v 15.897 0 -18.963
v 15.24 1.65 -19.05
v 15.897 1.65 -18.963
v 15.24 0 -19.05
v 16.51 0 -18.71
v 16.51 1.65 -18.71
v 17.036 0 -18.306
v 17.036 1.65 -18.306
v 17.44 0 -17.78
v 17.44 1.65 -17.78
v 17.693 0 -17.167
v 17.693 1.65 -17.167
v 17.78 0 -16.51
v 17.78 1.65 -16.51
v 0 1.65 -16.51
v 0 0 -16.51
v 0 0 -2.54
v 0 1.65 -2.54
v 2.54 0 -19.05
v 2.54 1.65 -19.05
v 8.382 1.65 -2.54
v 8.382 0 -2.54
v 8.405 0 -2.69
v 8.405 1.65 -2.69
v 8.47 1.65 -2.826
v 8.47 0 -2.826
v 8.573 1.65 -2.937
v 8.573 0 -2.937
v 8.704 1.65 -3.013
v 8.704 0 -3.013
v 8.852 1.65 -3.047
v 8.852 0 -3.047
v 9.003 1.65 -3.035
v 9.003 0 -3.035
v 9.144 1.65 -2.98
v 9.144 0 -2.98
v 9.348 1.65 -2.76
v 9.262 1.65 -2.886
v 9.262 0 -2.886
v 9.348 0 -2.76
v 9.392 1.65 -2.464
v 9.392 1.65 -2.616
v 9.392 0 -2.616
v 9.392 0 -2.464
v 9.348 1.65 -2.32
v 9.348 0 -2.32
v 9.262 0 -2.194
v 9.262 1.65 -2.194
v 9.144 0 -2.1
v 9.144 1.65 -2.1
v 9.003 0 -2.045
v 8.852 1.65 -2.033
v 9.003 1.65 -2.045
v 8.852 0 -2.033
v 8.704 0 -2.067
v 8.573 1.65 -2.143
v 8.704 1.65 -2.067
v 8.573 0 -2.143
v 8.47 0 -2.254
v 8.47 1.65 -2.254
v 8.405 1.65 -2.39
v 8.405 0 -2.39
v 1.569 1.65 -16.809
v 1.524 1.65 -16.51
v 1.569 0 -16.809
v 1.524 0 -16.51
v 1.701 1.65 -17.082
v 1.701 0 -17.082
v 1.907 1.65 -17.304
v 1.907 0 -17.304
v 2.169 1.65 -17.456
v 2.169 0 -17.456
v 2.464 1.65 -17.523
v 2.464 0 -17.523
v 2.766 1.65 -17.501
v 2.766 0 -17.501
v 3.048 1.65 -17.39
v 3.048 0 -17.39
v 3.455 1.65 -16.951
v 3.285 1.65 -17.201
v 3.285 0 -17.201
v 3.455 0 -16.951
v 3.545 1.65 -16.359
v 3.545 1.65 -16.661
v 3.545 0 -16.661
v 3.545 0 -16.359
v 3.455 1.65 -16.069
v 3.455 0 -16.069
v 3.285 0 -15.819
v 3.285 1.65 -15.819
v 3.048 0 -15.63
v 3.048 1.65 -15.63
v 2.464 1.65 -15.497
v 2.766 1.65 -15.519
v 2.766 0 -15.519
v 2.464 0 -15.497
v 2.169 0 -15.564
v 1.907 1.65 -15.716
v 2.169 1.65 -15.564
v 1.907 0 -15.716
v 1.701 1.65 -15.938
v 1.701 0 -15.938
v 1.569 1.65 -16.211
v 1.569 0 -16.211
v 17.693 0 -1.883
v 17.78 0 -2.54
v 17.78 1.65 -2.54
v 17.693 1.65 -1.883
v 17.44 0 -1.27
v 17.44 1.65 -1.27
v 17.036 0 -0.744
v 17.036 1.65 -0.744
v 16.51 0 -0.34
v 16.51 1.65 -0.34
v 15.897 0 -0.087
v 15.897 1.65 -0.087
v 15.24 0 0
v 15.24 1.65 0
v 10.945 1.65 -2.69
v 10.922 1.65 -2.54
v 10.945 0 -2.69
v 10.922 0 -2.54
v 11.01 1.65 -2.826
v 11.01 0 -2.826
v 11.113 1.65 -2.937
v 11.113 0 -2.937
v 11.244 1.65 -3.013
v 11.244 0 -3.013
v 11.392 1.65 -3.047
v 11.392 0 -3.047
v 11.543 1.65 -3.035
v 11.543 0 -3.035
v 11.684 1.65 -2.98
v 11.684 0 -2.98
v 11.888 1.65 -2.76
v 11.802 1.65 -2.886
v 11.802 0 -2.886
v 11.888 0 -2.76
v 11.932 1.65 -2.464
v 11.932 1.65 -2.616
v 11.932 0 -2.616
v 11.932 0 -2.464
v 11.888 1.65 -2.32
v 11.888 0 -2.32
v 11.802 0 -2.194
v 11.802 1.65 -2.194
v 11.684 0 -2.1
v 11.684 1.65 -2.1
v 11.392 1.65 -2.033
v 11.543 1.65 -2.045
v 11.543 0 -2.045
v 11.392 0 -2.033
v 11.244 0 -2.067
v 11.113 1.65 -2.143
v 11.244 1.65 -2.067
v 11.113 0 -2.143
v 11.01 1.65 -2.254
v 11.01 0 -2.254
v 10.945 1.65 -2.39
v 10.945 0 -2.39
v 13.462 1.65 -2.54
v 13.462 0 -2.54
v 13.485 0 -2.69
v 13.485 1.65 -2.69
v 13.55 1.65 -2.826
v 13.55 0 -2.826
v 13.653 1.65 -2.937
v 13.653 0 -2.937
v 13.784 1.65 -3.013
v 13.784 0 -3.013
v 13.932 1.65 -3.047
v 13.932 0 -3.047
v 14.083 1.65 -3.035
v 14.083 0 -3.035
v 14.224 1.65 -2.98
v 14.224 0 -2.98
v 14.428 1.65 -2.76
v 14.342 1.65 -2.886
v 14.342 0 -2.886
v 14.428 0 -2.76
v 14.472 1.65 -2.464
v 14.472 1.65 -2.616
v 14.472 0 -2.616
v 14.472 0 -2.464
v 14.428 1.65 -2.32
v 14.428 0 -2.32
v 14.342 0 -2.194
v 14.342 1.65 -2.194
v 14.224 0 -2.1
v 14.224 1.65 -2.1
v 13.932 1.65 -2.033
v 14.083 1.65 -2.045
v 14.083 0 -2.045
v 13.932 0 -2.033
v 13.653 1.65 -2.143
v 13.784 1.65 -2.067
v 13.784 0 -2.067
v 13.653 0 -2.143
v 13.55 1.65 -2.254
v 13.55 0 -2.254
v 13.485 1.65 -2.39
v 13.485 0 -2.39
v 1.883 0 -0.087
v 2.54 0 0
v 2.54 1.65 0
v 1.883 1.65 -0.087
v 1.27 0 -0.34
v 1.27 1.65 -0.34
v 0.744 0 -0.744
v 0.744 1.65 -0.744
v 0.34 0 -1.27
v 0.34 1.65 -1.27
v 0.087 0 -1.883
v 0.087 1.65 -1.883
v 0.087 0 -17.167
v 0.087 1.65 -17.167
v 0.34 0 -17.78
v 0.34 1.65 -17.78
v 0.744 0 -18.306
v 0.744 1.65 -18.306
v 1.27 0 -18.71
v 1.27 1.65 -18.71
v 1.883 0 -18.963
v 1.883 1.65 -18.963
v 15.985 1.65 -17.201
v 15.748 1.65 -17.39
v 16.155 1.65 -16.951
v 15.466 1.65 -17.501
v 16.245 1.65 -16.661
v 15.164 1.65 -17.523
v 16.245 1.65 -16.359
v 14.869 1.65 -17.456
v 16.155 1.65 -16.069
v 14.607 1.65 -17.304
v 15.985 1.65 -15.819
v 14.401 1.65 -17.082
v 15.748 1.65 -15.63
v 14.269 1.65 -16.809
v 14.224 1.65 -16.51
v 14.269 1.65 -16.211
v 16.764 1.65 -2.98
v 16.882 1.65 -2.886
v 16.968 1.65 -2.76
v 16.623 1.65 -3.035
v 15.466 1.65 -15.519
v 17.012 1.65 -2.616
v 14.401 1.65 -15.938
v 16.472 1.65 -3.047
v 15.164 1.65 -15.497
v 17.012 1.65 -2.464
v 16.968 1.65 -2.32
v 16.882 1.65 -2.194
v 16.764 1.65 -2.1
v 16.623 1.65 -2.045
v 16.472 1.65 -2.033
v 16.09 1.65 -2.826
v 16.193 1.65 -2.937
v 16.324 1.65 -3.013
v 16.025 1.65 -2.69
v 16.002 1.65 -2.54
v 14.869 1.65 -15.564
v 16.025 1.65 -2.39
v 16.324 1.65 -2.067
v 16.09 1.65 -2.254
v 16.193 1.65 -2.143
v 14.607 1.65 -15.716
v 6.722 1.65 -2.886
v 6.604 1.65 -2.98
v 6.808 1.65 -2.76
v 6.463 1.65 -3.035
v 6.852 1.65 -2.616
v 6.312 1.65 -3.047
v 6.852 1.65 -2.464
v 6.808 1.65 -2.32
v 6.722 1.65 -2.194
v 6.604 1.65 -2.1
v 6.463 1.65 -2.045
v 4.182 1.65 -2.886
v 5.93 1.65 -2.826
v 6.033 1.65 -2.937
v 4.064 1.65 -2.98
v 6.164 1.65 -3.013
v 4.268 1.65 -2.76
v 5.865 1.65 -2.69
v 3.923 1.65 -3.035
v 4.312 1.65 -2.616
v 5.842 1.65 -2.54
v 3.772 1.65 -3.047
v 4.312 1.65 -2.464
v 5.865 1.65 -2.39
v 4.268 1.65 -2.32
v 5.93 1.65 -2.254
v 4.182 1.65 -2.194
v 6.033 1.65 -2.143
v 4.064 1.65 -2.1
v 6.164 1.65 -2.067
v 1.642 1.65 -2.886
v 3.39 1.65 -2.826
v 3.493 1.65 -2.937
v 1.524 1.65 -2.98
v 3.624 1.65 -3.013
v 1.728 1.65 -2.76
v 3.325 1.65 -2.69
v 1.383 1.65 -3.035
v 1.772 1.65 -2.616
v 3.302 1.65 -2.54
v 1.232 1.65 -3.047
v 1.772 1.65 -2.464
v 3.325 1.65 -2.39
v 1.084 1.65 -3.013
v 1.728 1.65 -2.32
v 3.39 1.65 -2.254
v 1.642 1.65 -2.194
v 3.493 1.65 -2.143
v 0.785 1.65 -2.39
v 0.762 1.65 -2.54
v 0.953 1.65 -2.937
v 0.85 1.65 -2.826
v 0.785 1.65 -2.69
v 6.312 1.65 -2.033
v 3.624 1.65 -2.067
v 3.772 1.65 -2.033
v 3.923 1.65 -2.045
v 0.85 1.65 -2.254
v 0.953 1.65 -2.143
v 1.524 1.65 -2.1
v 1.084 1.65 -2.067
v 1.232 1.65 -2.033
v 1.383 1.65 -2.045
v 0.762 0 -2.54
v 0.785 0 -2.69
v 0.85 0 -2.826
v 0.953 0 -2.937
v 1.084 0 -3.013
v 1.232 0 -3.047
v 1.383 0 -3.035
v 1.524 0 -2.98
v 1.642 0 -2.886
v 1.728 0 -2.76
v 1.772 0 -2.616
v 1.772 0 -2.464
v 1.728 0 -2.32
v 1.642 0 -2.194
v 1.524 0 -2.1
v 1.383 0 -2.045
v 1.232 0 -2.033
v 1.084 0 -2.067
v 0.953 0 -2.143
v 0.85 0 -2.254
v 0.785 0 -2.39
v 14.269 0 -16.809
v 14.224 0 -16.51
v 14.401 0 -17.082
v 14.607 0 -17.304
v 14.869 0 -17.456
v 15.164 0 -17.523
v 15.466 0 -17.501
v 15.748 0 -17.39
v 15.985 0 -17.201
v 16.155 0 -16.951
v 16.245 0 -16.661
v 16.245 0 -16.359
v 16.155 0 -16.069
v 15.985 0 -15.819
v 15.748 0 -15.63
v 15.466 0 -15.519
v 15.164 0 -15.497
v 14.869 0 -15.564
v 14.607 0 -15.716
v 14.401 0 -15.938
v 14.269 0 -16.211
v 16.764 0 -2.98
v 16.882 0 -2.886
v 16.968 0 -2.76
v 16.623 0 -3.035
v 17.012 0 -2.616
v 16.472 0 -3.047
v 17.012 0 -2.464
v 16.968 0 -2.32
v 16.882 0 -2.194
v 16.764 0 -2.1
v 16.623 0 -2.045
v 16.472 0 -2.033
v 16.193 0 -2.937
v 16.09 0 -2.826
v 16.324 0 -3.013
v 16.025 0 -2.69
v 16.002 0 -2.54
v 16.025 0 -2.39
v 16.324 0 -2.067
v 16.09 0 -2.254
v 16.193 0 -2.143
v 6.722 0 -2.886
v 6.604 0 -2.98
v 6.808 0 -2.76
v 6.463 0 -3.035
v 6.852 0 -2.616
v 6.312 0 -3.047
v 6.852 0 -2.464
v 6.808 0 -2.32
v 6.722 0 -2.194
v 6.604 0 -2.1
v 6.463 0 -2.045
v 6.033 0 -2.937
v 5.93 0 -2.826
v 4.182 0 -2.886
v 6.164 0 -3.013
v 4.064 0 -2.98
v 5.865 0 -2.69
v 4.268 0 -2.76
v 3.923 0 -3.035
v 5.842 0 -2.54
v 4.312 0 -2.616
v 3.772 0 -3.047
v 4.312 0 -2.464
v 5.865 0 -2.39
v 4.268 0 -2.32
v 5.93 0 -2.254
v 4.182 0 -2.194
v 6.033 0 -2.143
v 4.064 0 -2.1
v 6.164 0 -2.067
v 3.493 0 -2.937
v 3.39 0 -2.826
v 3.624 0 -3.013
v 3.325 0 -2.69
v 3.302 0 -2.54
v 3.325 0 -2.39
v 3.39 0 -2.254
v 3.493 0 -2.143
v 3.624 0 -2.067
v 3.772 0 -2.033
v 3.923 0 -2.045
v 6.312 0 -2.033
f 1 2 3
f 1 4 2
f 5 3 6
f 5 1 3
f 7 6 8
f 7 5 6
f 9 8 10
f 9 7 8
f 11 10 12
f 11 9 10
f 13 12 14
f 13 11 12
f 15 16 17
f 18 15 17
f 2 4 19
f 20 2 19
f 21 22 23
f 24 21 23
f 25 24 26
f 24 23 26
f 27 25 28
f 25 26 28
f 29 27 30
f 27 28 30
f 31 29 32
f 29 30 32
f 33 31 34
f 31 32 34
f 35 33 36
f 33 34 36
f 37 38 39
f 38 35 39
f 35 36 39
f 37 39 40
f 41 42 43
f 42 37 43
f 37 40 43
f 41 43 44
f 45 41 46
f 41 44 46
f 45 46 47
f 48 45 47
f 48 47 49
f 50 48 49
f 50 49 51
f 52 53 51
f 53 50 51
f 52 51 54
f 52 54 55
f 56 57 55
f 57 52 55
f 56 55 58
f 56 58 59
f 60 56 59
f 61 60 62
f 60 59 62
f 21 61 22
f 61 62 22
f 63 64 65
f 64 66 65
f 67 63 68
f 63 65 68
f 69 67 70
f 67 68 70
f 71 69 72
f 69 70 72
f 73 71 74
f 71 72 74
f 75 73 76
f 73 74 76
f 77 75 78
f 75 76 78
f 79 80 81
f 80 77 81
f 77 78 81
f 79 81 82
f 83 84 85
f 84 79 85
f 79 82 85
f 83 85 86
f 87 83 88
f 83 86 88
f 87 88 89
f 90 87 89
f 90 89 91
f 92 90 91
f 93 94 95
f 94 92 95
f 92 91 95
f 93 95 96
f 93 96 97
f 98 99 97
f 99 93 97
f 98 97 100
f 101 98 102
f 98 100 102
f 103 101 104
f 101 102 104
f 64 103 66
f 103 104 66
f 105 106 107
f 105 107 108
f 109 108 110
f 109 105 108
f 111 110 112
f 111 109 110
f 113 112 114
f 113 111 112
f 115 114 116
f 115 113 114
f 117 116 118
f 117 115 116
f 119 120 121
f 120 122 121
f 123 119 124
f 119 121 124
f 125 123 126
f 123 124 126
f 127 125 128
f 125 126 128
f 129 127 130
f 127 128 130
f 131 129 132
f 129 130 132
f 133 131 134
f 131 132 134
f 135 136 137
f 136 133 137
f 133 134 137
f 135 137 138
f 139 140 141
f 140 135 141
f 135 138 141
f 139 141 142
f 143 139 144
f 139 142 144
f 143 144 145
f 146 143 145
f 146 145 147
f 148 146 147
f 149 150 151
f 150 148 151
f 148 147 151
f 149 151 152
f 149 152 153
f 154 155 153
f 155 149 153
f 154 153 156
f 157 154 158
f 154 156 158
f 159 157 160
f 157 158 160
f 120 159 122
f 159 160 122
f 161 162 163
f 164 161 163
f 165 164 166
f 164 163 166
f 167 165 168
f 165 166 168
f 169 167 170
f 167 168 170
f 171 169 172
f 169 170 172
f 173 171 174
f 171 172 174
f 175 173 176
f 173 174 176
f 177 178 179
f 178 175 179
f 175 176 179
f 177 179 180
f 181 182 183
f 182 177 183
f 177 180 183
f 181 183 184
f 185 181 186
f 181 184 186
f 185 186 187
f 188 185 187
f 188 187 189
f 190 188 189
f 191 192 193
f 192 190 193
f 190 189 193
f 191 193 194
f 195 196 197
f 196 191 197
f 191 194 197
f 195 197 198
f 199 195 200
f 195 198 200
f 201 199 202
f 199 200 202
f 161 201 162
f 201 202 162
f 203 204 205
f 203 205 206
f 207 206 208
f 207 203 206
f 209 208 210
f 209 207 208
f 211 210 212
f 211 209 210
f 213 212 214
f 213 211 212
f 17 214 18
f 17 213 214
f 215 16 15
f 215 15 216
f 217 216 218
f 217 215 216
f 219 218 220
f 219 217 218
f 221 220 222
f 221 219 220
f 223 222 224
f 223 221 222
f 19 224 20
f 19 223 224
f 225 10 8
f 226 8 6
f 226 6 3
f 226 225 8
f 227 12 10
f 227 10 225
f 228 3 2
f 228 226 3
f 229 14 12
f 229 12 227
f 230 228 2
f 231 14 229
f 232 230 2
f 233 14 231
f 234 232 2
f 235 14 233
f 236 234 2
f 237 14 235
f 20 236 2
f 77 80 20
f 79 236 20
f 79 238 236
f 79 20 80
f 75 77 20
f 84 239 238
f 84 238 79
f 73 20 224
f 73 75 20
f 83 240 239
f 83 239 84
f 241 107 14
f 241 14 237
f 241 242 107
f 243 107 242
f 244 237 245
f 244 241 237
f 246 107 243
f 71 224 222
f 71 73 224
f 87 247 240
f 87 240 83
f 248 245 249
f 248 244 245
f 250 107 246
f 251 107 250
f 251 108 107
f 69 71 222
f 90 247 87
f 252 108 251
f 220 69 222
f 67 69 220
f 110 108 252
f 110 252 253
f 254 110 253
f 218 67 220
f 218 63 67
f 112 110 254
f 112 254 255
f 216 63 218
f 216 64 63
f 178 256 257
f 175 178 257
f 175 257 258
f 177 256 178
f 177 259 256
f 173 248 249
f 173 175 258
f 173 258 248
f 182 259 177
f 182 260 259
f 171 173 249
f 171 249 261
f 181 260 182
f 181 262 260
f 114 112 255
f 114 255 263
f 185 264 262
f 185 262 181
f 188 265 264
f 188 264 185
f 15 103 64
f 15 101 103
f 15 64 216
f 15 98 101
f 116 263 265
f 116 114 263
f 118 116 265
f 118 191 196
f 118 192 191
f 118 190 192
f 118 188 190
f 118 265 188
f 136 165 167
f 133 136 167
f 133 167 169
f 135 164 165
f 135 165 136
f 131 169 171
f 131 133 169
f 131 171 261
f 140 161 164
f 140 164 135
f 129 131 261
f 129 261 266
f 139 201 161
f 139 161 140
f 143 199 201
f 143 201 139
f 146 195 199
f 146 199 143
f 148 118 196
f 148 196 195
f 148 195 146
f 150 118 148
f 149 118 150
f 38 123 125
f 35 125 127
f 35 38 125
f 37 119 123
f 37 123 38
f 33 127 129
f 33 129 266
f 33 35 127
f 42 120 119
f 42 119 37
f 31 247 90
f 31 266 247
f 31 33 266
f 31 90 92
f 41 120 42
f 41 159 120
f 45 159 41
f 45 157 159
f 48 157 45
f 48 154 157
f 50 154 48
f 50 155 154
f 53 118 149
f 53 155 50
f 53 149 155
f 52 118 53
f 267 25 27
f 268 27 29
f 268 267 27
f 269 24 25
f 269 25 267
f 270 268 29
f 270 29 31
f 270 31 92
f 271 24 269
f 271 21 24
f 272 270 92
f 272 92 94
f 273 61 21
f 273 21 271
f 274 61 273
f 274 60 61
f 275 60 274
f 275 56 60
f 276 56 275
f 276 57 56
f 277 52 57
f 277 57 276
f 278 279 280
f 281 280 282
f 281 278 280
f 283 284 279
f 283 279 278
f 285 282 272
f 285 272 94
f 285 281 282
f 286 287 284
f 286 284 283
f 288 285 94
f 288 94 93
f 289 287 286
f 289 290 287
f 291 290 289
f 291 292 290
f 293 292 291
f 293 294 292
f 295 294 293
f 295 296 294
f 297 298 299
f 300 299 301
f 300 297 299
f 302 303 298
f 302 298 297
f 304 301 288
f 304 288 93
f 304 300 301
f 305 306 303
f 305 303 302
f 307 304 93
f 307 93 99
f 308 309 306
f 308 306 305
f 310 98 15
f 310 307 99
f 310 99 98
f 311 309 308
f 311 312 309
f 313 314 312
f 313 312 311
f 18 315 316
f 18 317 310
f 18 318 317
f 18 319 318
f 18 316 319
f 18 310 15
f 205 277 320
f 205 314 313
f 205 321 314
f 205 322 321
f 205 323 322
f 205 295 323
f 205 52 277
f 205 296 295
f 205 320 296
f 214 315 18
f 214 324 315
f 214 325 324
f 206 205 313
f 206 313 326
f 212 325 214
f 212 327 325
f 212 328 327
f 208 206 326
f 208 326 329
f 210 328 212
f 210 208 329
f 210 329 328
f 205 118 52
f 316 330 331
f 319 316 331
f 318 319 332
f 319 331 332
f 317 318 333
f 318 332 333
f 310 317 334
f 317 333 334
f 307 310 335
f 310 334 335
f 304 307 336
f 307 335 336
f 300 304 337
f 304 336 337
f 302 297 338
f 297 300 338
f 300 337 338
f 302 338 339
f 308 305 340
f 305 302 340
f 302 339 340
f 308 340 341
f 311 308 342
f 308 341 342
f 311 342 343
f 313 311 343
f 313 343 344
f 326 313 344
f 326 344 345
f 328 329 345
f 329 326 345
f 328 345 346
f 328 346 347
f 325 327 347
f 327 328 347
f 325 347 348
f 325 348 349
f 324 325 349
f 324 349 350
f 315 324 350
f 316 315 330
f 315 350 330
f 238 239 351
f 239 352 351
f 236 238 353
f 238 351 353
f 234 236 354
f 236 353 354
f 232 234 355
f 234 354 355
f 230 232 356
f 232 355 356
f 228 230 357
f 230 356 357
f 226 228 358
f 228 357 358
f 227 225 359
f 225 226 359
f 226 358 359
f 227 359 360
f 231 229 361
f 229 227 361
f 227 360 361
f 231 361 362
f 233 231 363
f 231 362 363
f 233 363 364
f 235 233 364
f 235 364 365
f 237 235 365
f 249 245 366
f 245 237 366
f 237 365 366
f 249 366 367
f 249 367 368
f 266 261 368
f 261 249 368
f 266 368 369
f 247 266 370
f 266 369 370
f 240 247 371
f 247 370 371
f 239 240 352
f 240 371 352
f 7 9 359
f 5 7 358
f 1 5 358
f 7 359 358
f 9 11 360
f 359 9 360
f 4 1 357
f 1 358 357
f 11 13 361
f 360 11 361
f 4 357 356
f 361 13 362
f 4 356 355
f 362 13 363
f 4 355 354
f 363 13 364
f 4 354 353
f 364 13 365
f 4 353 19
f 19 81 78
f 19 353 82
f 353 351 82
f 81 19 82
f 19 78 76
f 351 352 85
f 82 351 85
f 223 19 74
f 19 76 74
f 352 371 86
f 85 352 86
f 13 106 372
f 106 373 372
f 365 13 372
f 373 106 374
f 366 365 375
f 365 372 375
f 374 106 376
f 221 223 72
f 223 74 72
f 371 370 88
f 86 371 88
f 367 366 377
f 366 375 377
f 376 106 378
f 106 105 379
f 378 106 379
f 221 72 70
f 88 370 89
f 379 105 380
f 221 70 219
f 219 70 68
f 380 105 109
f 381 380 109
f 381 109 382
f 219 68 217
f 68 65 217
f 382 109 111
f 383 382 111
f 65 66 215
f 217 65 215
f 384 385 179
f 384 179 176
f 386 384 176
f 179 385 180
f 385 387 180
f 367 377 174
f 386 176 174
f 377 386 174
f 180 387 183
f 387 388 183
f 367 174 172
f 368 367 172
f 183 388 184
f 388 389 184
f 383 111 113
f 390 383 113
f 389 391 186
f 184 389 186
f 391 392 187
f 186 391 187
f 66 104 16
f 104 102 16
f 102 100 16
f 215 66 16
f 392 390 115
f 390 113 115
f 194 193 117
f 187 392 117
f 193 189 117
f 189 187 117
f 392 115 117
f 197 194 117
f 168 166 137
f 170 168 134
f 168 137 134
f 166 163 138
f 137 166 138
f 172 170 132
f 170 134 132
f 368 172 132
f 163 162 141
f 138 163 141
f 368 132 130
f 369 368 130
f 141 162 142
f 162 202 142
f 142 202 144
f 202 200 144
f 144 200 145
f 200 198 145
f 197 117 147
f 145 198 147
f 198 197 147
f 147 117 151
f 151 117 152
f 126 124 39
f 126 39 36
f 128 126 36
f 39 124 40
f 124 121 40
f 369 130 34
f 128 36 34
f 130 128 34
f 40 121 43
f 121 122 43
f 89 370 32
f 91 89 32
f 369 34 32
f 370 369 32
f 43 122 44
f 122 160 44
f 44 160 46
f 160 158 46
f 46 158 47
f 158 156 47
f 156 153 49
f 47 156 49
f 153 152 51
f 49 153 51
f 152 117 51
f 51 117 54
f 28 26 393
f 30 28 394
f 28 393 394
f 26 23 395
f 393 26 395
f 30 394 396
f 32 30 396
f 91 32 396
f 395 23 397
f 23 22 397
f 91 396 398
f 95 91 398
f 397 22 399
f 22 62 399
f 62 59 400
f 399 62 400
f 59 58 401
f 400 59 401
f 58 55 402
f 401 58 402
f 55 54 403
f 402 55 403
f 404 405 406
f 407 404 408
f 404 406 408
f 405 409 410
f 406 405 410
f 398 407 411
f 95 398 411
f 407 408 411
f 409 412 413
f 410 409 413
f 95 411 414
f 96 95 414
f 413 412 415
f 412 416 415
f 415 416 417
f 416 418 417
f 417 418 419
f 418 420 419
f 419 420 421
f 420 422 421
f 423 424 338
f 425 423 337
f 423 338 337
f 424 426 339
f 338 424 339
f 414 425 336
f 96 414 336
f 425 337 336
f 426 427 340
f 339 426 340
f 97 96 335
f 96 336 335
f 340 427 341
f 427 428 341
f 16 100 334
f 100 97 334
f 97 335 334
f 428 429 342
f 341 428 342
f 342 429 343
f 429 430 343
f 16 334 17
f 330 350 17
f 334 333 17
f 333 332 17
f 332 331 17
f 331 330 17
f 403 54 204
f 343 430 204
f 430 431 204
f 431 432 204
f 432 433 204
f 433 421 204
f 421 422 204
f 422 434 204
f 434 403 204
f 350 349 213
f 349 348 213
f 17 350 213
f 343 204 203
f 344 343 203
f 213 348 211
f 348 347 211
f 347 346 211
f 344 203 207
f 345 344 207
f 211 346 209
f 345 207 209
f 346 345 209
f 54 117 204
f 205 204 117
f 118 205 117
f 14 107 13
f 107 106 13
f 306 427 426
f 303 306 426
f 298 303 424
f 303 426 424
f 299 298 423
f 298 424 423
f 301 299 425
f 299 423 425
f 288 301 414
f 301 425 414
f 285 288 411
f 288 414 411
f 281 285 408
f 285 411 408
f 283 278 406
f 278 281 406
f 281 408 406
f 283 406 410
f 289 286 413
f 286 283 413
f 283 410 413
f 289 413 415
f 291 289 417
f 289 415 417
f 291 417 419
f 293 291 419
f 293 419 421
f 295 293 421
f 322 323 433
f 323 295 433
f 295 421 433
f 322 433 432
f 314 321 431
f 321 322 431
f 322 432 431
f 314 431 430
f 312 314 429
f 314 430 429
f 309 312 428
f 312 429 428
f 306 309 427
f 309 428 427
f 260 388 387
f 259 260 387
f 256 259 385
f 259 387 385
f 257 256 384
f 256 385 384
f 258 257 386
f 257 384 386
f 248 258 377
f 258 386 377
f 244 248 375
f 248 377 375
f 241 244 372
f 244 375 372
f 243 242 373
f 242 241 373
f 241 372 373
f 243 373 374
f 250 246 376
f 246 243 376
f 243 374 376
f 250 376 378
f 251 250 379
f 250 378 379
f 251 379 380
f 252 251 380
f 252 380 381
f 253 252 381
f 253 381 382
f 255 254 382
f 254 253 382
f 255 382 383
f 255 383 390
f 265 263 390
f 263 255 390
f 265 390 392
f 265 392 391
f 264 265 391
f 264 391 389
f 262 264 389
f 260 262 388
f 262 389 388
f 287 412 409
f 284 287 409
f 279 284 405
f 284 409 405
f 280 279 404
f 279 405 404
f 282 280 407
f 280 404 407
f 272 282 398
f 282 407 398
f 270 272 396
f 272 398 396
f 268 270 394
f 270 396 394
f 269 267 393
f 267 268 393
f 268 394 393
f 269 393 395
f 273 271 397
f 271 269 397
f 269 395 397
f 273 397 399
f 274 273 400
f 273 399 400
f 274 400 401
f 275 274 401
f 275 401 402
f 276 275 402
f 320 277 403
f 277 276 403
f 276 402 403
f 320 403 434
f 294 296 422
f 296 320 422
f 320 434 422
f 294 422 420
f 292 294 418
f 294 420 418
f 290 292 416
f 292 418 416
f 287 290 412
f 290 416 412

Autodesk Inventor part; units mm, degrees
ref_plane "YZ Plane" through (0, 0, 0) normal (1, 0, 0) x (0, 1, 0)
ref_plane "XZ Plane" through (0, 0, 0) normal (0, 1, 0) x (-1, 0, 0)
ref_plane "XY Plane" through (0, 0, 0) normal (0, 0, 1) x (1, 0, 0)
sketch "Sketch1" plane through (0, 0, 0) normal (0, 1, 0) x (-1, 0, 0)
  line L0 (-2.54, 0) -> (-15.24, 0)
  line L1 (-17.78, -2.54) -> (-17.78, -16.51)
  line L2 (-15.24, -19.05) -> (-2.54, -19.05)
  line L3 (0, -16.51) -> (0, -2.54)
  arc A0 (-2.54, -19.05) -> (0, -16.51) centre (-2.54, -16.51) ccw
  arc A1 (-17.78, -16.51) -> (-15.24, -19.05) centre (-15.24, -16.51) ccw
  arc A2 (0, -2.54) -> (-2.54, 0) centre (-2.54, -2.54) ccw
  arc A3 (-15.24, 0) -> (-17.78, -2.54) centre (-15.24, -2.54) ccw
  circle A4 centre (-2.54, -16.51) radius 1.016
  circle A5 centre (-15.24, -16.51) radius 1.016
  line L4 (0, -2.54) -> (-17.78, -2.54) construction
  circle A6 centre (-1.27, -2.54) radius 0.508
  circle A7 centre (-3.81, -2.54) radius 0.508
  circle A8 centre (-6.35, -2.54) radius 0.508
  circle A9 centre (-8.89, -2.54) radius 0.508
  circle A10 centre (-11.43, -2.54) radius 0.508
  circle A11 centre (-13.97, -2.54) radius 0.508
  circle A12 centre (-16.51, -2.54) radius 0.508
  point P0 (0, 0)
  point P1 (-17.78, -19.05)
  point P2 (-17.78, 0)
  point P3 (0, -19.05)
  dimension "d0" = 17.78
  dimension "d1" = 19.05
  dimension "d2" = 2.54
  dimension "d3" = 2.032
  dimension "d6" = 2.54
  dimension "d11" = 1.27
  dimension "d12" = 1.27
  dimension "d13" = 1.016
  dimension "d16" = 2.54
extrude "Extrusion1" add sketch "Sketch1" along normal blind 1.65
equation "\"d11\" = d12"
properties part number "BMP280 footprint"
